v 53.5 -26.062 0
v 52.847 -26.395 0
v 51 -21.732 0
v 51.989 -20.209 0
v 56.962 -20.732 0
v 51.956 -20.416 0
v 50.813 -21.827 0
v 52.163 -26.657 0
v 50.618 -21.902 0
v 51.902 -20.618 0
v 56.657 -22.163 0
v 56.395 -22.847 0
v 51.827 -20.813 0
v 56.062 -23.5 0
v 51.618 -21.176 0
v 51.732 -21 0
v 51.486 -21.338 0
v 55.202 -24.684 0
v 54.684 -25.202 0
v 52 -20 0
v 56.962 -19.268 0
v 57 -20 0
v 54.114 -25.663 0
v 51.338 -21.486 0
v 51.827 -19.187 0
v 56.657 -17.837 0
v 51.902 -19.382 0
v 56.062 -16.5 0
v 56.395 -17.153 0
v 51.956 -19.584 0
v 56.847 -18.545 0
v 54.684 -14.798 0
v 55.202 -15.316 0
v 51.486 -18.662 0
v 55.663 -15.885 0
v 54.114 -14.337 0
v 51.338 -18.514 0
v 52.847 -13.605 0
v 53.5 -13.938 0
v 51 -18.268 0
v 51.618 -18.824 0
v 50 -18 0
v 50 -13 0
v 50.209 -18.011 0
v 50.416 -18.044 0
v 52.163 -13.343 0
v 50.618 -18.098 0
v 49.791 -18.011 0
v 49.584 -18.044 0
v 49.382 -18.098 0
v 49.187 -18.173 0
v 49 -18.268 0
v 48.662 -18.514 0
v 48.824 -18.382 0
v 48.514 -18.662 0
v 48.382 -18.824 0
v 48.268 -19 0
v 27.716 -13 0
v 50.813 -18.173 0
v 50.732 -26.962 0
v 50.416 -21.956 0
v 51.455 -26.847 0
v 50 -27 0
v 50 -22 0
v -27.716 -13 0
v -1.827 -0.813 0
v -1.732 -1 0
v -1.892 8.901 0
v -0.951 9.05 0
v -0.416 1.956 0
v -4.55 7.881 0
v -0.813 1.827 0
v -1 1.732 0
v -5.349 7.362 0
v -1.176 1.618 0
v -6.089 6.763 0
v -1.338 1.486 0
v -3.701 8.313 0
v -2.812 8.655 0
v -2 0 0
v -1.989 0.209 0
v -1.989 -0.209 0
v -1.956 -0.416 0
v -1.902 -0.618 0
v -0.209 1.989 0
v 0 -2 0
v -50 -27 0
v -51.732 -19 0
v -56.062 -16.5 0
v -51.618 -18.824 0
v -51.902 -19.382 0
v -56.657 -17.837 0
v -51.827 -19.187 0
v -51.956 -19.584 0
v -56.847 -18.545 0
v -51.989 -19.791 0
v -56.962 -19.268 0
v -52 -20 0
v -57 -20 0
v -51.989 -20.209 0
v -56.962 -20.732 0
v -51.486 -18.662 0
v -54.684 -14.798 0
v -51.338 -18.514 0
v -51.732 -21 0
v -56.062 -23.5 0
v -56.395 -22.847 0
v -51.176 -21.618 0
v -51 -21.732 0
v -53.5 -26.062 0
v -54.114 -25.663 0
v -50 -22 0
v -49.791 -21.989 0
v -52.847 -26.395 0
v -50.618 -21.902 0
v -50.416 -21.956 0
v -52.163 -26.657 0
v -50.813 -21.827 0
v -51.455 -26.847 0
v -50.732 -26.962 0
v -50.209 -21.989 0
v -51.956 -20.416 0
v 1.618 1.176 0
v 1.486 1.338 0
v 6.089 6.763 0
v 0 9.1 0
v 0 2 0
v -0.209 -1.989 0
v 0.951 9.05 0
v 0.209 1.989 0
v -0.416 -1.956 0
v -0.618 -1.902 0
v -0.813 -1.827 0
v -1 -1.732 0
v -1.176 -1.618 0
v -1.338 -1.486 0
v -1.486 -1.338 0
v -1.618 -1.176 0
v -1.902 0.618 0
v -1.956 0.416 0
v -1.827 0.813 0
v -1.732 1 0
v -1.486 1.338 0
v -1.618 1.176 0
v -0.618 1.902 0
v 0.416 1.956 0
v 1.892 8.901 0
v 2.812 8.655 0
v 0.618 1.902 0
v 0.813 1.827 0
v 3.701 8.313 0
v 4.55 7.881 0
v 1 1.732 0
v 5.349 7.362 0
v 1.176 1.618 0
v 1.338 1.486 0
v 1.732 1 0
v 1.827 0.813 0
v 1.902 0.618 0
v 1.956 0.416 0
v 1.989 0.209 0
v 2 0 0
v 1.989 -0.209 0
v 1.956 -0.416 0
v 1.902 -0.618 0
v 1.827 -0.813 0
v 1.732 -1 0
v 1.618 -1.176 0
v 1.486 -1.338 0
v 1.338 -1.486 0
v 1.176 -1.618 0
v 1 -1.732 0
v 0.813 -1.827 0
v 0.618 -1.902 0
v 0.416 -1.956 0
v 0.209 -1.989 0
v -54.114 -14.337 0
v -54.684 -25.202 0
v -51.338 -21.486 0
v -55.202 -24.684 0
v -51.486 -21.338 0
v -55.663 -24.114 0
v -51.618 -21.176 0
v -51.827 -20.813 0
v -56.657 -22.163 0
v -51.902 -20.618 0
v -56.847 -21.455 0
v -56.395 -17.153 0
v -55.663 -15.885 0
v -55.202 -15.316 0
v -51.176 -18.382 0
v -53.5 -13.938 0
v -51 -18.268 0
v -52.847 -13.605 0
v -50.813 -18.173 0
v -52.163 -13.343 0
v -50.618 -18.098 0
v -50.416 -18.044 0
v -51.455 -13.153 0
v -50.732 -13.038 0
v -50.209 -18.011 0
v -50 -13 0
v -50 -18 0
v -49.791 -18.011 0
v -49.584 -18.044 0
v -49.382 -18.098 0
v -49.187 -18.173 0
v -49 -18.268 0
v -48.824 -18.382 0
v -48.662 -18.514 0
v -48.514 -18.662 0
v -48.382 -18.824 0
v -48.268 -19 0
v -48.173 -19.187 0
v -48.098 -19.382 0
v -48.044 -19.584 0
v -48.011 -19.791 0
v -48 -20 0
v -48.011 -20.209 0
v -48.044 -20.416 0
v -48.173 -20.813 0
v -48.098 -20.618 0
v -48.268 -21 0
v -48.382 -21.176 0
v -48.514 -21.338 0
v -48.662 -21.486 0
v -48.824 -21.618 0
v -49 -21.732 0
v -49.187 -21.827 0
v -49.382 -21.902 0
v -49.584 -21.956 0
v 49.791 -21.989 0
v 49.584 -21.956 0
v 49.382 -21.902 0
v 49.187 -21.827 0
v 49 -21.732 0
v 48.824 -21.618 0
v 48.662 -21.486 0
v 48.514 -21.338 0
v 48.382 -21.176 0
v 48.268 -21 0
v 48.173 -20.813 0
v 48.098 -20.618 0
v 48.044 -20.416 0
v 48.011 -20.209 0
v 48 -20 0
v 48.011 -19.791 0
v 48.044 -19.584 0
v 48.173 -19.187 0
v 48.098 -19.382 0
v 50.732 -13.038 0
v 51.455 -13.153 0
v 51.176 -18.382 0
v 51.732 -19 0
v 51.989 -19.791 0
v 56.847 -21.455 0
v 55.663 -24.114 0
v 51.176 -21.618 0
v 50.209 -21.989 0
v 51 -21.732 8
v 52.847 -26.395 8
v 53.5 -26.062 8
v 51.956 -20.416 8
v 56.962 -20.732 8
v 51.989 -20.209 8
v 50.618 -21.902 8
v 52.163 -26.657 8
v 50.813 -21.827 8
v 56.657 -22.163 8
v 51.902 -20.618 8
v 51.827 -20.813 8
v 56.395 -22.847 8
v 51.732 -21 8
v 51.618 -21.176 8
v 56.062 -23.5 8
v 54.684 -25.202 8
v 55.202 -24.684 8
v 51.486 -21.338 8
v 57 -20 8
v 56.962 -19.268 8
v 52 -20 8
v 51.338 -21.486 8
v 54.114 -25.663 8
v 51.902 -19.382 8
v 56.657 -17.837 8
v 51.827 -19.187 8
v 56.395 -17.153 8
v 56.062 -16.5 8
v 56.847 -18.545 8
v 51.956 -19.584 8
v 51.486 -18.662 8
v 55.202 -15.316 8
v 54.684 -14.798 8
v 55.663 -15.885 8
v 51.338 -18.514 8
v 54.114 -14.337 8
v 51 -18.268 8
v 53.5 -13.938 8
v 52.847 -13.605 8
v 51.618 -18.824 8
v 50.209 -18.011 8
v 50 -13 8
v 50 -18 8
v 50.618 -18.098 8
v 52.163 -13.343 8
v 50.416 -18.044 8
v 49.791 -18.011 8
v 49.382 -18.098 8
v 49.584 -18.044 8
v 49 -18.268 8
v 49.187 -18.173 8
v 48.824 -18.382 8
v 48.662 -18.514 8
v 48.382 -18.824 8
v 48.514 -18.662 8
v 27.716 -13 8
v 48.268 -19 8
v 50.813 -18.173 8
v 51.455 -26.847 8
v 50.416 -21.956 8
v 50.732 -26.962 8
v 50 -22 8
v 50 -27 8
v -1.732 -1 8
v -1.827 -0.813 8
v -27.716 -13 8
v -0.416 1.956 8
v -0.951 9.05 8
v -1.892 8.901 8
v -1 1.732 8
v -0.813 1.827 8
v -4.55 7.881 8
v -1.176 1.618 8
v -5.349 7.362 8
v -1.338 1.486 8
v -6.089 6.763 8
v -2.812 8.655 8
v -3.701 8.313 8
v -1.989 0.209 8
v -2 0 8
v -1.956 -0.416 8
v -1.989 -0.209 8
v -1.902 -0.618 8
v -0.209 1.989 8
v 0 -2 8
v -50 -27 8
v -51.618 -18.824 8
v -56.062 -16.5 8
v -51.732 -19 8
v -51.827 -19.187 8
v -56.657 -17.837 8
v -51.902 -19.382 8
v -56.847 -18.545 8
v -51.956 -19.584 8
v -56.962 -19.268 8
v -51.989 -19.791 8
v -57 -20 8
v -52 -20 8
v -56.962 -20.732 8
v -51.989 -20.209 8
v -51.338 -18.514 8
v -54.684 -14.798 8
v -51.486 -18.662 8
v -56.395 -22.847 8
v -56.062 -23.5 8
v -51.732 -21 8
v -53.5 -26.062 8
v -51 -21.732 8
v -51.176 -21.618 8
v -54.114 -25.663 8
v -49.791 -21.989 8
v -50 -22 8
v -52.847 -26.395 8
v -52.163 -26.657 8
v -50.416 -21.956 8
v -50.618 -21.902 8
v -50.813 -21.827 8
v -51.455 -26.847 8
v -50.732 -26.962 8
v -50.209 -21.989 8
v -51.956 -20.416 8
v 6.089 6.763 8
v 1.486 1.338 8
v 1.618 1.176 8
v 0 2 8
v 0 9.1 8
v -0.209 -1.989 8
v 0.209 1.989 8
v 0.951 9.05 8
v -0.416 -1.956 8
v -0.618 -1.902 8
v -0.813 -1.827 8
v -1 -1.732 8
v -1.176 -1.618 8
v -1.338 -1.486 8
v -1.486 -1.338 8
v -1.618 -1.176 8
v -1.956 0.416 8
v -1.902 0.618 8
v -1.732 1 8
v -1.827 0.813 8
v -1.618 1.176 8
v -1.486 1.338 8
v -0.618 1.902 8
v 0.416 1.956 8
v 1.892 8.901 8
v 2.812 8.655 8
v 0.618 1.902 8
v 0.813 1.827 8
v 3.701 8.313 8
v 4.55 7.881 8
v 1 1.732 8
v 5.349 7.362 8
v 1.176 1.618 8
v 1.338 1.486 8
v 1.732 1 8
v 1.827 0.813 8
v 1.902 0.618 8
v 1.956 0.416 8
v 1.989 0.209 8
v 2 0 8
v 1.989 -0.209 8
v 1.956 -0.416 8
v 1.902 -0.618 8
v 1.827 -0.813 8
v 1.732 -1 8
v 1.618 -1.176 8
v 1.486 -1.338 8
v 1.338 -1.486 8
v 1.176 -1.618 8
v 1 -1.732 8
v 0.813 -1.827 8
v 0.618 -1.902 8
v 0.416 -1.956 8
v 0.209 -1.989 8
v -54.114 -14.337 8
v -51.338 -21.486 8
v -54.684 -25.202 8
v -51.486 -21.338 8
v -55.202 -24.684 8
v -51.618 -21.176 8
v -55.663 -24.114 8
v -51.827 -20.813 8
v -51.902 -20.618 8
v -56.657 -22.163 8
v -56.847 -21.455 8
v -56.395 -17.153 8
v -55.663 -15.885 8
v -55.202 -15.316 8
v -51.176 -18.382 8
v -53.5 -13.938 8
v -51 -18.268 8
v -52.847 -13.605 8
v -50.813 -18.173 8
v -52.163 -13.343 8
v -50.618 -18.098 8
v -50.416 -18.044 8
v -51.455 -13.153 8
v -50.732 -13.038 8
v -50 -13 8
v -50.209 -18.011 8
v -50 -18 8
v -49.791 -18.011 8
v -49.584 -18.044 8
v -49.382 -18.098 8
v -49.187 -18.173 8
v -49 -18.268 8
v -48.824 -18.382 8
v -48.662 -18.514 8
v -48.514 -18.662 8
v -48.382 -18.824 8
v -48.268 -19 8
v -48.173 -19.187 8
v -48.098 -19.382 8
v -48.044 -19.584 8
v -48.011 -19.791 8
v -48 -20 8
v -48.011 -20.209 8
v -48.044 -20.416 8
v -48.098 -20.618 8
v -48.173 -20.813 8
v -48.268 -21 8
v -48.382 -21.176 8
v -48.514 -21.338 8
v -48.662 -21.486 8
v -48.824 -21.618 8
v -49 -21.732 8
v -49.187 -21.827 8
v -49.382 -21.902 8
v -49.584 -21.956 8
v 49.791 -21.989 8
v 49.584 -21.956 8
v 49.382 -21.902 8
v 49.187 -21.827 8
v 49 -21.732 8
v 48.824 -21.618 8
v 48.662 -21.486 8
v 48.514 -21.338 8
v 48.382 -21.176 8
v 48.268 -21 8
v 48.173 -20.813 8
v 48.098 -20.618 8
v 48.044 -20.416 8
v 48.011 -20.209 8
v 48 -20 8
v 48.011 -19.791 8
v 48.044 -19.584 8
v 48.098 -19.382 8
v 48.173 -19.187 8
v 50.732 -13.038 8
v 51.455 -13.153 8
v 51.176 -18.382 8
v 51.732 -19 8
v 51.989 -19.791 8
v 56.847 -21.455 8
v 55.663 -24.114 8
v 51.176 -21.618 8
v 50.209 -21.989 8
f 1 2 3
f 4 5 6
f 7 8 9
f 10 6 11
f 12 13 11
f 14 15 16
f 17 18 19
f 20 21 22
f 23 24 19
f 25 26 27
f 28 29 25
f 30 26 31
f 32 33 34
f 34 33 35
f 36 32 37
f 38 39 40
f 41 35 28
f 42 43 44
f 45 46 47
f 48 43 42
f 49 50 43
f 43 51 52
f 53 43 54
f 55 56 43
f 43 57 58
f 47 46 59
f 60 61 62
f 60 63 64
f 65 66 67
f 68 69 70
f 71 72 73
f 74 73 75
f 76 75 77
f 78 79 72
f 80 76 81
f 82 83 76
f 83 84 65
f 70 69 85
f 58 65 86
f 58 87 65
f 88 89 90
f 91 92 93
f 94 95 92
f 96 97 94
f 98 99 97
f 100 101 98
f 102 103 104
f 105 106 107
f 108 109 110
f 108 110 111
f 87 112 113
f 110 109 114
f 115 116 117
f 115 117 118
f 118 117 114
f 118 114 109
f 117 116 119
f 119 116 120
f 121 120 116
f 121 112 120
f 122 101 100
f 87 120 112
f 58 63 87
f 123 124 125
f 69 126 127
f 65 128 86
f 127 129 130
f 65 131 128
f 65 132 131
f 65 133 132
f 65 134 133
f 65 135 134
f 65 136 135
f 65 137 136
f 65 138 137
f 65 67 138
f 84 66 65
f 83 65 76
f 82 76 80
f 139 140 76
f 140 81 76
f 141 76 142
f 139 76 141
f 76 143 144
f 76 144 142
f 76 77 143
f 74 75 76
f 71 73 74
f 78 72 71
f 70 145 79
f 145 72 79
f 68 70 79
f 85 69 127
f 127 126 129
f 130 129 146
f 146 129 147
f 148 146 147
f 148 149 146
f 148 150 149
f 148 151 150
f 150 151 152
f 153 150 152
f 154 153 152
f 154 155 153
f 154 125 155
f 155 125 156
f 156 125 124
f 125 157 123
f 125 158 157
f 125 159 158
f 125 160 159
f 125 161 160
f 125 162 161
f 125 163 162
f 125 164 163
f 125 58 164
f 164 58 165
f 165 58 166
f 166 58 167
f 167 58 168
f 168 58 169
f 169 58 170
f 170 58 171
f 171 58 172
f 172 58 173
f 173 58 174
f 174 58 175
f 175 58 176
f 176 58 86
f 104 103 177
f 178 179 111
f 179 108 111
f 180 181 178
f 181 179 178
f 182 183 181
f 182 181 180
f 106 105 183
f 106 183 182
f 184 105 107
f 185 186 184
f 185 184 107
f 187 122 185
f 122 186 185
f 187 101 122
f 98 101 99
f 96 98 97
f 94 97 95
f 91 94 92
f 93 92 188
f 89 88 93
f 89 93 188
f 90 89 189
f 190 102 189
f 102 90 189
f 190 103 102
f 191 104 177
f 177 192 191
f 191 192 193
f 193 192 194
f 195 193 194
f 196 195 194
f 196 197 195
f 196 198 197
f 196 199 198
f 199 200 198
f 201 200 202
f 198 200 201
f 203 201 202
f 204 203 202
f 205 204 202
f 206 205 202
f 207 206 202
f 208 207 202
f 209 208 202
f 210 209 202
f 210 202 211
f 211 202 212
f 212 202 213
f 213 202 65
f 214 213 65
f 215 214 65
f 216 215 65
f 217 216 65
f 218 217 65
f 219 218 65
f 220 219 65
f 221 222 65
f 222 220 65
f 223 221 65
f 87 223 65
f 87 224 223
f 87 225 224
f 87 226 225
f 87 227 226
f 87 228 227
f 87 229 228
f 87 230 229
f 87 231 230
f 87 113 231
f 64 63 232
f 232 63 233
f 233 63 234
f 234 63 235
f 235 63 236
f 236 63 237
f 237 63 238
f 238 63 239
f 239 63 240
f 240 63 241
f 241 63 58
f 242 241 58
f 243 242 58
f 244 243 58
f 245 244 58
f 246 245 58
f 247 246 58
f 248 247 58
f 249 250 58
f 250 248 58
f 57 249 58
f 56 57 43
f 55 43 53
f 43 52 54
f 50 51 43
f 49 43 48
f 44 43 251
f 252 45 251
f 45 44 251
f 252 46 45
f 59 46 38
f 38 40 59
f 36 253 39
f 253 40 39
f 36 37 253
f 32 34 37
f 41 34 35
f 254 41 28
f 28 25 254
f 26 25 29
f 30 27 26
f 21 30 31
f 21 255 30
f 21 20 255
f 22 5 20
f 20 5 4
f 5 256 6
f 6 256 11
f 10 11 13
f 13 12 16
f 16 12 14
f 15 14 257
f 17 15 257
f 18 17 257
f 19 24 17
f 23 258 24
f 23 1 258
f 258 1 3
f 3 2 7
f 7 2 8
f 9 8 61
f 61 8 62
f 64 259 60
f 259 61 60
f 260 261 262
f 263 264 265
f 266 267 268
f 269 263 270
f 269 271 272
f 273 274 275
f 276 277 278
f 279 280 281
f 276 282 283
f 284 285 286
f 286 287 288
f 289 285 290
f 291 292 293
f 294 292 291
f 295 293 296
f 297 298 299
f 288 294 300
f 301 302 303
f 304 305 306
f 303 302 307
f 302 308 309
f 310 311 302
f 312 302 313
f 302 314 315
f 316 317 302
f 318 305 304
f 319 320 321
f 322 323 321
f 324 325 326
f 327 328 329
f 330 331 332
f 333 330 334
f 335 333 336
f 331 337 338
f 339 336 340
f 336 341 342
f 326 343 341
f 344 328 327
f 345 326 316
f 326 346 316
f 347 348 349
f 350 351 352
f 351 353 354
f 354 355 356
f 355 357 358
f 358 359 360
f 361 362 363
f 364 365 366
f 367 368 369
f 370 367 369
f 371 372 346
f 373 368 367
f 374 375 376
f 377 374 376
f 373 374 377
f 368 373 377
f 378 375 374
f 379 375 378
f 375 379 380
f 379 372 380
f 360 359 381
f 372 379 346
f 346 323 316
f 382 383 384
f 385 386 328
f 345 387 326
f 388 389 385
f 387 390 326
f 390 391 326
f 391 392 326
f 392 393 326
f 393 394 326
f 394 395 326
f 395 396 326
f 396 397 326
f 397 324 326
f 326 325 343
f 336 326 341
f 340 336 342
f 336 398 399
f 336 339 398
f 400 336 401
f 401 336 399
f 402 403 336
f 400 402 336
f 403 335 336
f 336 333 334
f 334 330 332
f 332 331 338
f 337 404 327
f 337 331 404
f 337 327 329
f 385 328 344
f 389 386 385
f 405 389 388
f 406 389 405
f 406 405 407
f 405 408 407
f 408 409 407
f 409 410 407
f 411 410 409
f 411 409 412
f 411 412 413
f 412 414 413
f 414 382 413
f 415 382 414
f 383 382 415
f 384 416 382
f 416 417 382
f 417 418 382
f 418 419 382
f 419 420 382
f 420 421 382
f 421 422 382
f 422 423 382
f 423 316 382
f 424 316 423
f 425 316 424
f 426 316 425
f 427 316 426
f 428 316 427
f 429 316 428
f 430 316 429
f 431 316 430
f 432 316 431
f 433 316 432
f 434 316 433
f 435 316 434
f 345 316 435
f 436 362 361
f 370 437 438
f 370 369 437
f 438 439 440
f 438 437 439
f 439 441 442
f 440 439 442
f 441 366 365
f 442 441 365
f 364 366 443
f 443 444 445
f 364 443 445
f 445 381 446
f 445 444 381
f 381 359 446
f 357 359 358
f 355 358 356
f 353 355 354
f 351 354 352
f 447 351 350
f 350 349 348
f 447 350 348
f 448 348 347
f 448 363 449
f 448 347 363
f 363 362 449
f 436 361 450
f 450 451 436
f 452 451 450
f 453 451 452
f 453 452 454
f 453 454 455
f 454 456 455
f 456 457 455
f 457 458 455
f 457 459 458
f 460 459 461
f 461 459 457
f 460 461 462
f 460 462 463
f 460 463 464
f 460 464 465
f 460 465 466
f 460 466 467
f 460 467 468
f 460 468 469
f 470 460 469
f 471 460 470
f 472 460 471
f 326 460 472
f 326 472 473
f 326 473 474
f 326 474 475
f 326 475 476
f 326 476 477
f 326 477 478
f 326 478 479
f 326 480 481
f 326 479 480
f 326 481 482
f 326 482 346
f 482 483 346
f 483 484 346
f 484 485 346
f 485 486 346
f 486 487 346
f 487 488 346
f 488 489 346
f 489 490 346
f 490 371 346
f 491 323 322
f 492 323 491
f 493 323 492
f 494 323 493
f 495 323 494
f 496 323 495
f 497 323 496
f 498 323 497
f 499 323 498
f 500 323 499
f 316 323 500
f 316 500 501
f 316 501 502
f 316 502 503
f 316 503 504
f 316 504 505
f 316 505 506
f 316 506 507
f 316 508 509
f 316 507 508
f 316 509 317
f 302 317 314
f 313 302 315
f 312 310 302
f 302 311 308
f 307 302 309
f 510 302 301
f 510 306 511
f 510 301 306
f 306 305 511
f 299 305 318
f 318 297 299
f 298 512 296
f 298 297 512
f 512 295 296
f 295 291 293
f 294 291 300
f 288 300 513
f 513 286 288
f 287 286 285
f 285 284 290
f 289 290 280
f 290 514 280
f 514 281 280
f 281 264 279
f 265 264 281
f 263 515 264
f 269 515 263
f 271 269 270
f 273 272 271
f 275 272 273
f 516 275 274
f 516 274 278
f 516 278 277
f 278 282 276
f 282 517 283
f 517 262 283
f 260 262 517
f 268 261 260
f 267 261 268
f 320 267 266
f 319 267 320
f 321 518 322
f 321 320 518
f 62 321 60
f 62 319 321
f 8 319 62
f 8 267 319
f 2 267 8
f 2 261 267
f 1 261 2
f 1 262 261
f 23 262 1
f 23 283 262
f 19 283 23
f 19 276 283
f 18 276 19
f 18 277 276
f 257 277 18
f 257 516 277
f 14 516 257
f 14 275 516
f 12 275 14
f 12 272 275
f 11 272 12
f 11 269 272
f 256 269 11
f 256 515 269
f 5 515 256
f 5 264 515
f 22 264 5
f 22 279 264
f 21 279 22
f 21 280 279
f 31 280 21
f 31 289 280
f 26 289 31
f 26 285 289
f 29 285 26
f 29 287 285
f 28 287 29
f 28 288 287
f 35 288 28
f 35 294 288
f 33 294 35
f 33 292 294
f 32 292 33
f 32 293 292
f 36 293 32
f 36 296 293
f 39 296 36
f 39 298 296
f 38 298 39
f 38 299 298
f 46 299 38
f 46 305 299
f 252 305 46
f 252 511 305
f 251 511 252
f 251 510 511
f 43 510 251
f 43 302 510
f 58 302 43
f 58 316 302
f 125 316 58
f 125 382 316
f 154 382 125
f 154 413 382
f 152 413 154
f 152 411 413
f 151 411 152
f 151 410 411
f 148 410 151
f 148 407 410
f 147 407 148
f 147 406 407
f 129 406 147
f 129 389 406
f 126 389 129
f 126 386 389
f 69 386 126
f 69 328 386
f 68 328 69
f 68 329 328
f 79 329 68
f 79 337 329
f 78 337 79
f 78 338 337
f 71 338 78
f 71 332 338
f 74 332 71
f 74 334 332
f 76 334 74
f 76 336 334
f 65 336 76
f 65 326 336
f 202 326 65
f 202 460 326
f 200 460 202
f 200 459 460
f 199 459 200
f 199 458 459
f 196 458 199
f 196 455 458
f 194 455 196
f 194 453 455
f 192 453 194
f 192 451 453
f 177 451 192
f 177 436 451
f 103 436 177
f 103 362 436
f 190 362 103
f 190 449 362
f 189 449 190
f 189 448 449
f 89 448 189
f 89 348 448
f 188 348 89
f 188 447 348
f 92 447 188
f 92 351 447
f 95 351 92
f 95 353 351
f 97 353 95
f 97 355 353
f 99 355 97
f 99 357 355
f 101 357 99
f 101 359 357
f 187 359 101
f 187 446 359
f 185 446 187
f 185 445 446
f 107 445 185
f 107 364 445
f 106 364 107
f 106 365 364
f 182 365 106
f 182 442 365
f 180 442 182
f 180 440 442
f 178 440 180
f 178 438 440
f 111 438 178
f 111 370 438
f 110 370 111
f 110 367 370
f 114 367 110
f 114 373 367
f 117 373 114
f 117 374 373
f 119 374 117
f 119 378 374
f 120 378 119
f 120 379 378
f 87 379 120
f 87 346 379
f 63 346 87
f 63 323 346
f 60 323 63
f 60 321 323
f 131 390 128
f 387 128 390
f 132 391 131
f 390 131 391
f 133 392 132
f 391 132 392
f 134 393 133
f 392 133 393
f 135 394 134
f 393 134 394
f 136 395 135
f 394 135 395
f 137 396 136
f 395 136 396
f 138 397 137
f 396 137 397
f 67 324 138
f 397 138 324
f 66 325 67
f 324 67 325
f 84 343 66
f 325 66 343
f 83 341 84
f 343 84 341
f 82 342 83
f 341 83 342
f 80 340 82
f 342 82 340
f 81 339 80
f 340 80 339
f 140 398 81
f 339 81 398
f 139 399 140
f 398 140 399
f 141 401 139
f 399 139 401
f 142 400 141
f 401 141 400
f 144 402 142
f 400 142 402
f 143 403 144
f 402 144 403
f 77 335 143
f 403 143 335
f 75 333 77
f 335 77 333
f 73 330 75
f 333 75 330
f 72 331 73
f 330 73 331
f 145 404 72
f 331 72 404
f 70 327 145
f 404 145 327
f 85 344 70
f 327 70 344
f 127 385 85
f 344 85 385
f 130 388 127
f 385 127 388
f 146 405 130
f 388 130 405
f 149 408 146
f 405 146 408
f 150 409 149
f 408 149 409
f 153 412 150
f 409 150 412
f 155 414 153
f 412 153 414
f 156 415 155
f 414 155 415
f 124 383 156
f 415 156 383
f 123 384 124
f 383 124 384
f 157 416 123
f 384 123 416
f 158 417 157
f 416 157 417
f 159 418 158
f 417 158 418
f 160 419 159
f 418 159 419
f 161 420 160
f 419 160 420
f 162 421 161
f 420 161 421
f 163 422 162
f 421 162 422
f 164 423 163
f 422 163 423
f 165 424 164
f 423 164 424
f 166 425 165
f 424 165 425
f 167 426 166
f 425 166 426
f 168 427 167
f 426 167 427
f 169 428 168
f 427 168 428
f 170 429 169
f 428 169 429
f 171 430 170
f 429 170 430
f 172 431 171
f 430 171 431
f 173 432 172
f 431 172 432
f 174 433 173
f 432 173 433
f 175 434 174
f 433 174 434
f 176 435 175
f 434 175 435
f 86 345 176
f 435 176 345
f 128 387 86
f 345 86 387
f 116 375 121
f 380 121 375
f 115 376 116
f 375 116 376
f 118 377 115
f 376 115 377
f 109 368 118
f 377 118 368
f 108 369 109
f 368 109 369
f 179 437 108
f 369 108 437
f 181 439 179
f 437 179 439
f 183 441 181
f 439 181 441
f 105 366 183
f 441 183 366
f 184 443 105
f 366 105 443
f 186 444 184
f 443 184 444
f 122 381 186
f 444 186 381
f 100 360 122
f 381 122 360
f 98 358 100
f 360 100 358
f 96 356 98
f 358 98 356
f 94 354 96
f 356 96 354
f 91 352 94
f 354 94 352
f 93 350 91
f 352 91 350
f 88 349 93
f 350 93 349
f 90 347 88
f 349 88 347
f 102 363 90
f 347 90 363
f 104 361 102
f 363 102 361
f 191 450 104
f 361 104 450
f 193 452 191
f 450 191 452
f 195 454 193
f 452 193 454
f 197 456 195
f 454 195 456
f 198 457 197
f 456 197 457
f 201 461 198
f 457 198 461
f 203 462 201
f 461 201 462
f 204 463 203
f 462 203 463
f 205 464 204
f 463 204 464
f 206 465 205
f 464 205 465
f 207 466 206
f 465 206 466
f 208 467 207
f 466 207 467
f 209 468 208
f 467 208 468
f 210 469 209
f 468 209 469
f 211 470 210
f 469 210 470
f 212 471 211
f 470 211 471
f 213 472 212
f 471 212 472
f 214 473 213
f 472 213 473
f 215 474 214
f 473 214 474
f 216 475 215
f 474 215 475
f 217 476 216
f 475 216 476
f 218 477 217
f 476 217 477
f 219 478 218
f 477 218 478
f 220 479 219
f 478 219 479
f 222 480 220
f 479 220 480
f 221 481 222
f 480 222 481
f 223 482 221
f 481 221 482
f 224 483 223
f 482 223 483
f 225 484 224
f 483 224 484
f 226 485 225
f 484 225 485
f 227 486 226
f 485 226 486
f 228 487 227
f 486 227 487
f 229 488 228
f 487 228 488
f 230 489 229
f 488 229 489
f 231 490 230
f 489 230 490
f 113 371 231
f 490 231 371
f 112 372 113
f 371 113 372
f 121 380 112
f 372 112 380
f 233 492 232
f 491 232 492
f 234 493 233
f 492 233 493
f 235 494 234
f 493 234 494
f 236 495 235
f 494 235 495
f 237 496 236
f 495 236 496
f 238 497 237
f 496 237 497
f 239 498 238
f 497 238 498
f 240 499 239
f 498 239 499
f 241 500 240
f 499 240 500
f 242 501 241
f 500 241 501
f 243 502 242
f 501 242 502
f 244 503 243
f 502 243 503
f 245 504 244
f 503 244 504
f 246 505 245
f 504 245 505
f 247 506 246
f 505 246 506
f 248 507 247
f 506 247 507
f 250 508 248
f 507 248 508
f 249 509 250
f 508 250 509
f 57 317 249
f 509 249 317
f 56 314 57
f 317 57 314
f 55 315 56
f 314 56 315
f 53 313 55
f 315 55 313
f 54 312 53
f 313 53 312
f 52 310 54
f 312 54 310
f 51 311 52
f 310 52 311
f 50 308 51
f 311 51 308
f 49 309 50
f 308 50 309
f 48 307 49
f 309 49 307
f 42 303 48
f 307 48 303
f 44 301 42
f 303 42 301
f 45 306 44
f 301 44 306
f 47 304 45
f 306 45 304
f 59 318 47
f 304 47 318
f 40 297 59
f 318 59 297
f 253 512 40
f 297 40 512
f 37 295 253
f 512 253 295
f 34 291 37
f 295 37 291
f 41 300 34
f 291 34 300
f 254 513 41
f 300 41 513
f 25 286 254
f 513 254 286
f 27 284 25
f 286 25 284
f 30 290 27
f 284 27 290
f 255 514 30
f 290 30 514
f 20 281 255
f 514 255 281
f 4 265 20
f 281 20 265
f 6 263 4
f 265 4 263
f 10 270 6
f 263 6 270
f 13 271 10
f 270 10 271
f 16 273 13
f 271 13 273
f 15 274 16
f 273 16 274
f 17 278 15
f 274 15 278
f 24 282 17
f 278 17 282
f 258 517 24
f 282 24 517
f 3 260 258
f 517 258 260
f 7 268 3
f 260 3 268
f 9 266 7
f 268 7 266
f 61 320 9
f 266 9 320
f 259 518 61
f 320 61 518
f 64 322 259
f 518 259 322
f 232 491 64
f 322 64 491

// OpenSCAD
// =================================================================
// 直径5cmホイール対応 ロッカーボギー機構 パラメトリック設計
// =================================================================

/* [表示・出力コントロール] */
// 出力したいパーツを選択してください
part = "bogie"; // [all: 全て配置（確認用）, rocker: ロッカーアームのみ, bogie: ボギーアームのみ]

/* [共通パラメータ] */
$fn = 60;          // 円の分割数（精度）
link_h = 8;        // アームの厚み (mm)
pin_d = 4;         // シャフト・ネジ用の穴の直径 (mm) - 使用する軸に合わせ変更してください
joint_d = 14;      // ジョイント結合部の外径 (mm) - 強度確保のため少し太くしました

/* [既存ホイール基準パラメータ (変更不可)] */
wheel_d = 50;      // ホイールの直径 = 50mm (5cm)
wheel_r = wheel_d / 2; // ホイールの半径 = 25mm
wheel_w = 20;      // ホイールの想定幅 (mm)

/* [アーム寸法設計 (直径50mmホイールの干渉回避用)] */
// ボギーアームの軸間距離（ミドル〜リアホイール間）。直径50mmに対し、傾きを考慮して100mmに設定
bogie_length = 100; 

// ロッカーアームのフロント軸から、ボギーピボット（結合点）までの水平距離
// ホイール同士の衝突を防ぐため、130mmのゆとりを確保
rocker_total_x = 130; 


// --- パーツの配置・プレビュー処理 ---
if (part == "all") {
    // 1. ロッカーアーム
    color("LightCoral") rocker_arm();
    
    // 2. ボギーアーム（ロッカーアームのボギーピボット位置へ移動して配置）
    translate([rocker_total_x, -15, -link_h - 2]) 
        color("LightSteelBlue") bogie_arm();
    
    // 3. 既存ホイールのダミー表示（位置関係確認用：半透明）
    % group() {
        // フロントホイール
        translate([0, 10, 0]) rotate([90, 0, 0]) dummy_wheel();
        // ミドルホイール（ボギーアームの前方軸）
        translate([rocker_total_x - (bogie_length/2), -10, -link_h - 2]) rotate([90, 0, 0]) dummy_wheel();
        // リアホイール（ボギーアームの後方軸）
        translate([rocker_total_x + (bogie_length/2), -10, -link_h - 2]) rotate([90, 0, 0]) dummy_wheel();
    }
}

if (part == "rocker") {
    rocker_arm();
}

if (part == "bogie") {
    bogie_arm();
}


// ==========================================
// コンポーネント 1: ロッカーアーム (Rocker Arm)
// ==========================================
module rocker_arm() {
    // 各ピボットの座標定義
    p_front = [0, 0];                     // フロントホイール軸
    p_body  = [70, 45];                   // 車体差動ギア接続ピボット（高さを出して地上高を確保）
    p_bogie = [rocker_total_x, -15];      // ボギーアーム接続ピボット

    linear_extrude(height = link_h) {
        difference() {
            union() {
                // フロント軸から車体ピボットへのリンク
                hull() {
                    translate(p_front) circle(d = joint_d);
                    translate(p_body)  circle(d = joint_d * 1.6); // 負荷がかかる中心は太く
                }
                // 車体ピボットからボギーピボットへのリンク
                hull() {
                    translate(p_body)  circle(d = joint_d * 1.6);
                    translate(p_bogie) circle(d = joint_d * 1.3);
                }
            }
            // 1. フロントホイール取付穴
            translate(p_front) circle(d = pin_d); 
            
            // 2. 車体（ディファレンシャル機構）接続穴
            translate(p_body) circle(d = pin_d); 
            
            // 3. ボギーアーム接続穴
            translate(p_bogie) circle(d = pin_d); 
        }
    }
}

// ==========================================
// コンポーネント 2: ボギーアーム (Bogie Arm)
// ==========================================
module bogie_arm() {
    // ロッカーとの接続ピボットを原点(0,0)とする
    p_pivot = [0, 0];
    p_middle = [-(bogie_length / 2), -20]; // 前方（ミドルホイール）軸
    p_rear   = [(bogie_length / 2), -20];  // 後方（リアホイール）軸

    linear_extrude(height = link_h) {
        difference() {
            union() {
                // ミドルからリアまでの下部メインフレーム
                hull() {
                    translate(p_middle) circle(d = joint_d);
                    translate(p_rear)   circle(d = joint_d);
                }
                // 下部フレームから上部のロッカー接続ピボットへの立ち上がり
                hull() {
                    translate(p_pivot) circle(d = joint_d * 1.3);
                    translate([-(bogie_length / 4), -20]) circle(d = joint_d);
                    translate([(bogie_length / 4), -20]) circle(d = joint_d);
                }
            }
            // 1. ロッカーアームとの接続穴
            translate(p_pivot) circle(d = pin_d); 
            
            // 2. ミドルホイール取付穴
            translate(p_middle) circle(d = pin_d); 
            
            // 3. リアホイール取付穴
            translate(p_rear) circle(d = pin_d); 
        }
    }
}

// ==========================================
// 参考用: 既存ホイールのダミー (Dummy Wheel)
// ==========================================
// ※3Dプリントはしません（位置確認のプレビュー専用）
module dummy_wheel() {
    difference() {
        cylinder(r = wheel_r, h = wheel_w, center = true);
        cylinder(d = pin_d, h = wheel_w + 2, center = true);
    }
}
